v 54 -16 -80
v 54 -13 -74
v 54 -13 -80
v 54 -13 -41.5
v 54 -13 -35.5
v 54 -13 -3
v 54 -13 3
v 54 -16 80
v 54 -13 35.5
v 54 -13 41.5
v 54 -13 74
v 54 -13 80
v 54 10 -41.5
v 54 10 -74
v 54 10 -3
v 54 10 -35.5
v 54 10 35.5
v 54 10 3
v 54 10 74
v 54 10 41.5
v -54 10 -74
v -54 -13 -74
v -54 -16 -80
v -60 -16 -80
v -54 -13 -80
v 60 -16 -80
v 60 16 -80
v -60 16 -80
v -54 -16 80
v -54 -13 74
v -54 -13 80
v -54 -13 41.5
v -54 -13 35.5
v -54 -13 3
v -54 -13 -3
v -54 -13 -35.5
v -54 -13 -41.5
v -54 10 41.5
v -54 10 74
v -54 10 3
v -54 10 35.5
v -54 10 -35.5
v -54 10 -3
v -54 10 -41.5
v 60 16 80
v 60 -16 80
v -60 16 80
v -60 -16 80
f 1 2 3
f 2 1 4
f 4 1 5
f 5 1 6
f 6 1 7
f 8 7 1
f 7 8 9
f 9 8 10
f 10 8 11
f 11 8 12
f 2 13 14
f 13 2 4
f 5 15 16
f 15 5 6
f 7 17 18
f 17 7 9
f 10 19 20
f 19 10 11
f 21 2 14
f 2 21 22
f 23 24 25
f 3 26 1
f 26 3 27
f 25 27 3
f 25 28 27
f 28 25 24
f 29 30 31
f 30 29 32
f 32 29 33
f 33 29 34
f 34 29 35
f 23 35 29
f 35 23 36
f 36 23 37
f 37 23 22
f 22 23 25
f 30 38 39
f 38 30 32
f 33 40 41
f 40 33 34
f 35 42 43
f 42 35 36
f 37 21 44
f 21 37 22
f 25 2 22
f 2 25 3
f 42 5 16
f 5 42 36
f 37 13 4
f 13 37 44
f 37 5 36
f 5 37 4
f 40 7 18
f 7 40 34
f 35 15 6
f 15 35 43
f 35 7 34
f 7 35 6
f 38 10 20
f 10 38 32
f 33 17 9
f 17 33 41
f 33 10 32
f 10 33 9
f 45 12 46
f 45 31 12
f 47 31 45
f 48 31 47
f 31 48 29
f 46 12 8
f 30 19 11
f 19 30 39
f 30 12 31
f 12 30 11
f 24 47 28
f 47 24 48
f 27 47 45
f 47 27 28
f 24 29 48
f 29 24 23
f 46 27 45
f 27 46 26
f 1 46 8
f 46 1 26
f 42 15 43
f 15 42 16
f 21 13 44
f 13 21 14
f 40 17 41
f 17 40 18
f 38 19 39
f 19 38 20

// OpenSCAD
// 3DScad sample: parametric bookshelf
// Uses only the currently round-trippable subset.

module scene_model() {
    shelf_w = 120;
    shelf_d = 32;
    shelf_h = 160;
    thickness = 6;
    num_shelves = 5;

    union() {
        translate([-shelf_w / 2 + thickness / 2, 0, 0]) {
            cube([thickness, shelf_d, shelf_h], center=true);
        }
        translate([shelf_w / 2 - thickness / 2, 0, 0]) {
            cube([thickness, shelf_d, shelf_h], center=true);
        }
        translate([0, shelf_d / 2 - thickness / 2, 0]) {
            cube([shelf_w - thickness * 2, thickness, shelf_h], center=true);
        }
        for (i = [0 : 1 : num_shelves - 1]) {
            translate([0, 0, -shelf_h / 2 + thickness / 2 + i * (shelf_h - thickness) / (num_shelves - 1)]) {
                cube([shelf_w - thickness * 2, shelf_d - thickness, thickness], center=true);
            }
        }
    }
}

scene_model();
